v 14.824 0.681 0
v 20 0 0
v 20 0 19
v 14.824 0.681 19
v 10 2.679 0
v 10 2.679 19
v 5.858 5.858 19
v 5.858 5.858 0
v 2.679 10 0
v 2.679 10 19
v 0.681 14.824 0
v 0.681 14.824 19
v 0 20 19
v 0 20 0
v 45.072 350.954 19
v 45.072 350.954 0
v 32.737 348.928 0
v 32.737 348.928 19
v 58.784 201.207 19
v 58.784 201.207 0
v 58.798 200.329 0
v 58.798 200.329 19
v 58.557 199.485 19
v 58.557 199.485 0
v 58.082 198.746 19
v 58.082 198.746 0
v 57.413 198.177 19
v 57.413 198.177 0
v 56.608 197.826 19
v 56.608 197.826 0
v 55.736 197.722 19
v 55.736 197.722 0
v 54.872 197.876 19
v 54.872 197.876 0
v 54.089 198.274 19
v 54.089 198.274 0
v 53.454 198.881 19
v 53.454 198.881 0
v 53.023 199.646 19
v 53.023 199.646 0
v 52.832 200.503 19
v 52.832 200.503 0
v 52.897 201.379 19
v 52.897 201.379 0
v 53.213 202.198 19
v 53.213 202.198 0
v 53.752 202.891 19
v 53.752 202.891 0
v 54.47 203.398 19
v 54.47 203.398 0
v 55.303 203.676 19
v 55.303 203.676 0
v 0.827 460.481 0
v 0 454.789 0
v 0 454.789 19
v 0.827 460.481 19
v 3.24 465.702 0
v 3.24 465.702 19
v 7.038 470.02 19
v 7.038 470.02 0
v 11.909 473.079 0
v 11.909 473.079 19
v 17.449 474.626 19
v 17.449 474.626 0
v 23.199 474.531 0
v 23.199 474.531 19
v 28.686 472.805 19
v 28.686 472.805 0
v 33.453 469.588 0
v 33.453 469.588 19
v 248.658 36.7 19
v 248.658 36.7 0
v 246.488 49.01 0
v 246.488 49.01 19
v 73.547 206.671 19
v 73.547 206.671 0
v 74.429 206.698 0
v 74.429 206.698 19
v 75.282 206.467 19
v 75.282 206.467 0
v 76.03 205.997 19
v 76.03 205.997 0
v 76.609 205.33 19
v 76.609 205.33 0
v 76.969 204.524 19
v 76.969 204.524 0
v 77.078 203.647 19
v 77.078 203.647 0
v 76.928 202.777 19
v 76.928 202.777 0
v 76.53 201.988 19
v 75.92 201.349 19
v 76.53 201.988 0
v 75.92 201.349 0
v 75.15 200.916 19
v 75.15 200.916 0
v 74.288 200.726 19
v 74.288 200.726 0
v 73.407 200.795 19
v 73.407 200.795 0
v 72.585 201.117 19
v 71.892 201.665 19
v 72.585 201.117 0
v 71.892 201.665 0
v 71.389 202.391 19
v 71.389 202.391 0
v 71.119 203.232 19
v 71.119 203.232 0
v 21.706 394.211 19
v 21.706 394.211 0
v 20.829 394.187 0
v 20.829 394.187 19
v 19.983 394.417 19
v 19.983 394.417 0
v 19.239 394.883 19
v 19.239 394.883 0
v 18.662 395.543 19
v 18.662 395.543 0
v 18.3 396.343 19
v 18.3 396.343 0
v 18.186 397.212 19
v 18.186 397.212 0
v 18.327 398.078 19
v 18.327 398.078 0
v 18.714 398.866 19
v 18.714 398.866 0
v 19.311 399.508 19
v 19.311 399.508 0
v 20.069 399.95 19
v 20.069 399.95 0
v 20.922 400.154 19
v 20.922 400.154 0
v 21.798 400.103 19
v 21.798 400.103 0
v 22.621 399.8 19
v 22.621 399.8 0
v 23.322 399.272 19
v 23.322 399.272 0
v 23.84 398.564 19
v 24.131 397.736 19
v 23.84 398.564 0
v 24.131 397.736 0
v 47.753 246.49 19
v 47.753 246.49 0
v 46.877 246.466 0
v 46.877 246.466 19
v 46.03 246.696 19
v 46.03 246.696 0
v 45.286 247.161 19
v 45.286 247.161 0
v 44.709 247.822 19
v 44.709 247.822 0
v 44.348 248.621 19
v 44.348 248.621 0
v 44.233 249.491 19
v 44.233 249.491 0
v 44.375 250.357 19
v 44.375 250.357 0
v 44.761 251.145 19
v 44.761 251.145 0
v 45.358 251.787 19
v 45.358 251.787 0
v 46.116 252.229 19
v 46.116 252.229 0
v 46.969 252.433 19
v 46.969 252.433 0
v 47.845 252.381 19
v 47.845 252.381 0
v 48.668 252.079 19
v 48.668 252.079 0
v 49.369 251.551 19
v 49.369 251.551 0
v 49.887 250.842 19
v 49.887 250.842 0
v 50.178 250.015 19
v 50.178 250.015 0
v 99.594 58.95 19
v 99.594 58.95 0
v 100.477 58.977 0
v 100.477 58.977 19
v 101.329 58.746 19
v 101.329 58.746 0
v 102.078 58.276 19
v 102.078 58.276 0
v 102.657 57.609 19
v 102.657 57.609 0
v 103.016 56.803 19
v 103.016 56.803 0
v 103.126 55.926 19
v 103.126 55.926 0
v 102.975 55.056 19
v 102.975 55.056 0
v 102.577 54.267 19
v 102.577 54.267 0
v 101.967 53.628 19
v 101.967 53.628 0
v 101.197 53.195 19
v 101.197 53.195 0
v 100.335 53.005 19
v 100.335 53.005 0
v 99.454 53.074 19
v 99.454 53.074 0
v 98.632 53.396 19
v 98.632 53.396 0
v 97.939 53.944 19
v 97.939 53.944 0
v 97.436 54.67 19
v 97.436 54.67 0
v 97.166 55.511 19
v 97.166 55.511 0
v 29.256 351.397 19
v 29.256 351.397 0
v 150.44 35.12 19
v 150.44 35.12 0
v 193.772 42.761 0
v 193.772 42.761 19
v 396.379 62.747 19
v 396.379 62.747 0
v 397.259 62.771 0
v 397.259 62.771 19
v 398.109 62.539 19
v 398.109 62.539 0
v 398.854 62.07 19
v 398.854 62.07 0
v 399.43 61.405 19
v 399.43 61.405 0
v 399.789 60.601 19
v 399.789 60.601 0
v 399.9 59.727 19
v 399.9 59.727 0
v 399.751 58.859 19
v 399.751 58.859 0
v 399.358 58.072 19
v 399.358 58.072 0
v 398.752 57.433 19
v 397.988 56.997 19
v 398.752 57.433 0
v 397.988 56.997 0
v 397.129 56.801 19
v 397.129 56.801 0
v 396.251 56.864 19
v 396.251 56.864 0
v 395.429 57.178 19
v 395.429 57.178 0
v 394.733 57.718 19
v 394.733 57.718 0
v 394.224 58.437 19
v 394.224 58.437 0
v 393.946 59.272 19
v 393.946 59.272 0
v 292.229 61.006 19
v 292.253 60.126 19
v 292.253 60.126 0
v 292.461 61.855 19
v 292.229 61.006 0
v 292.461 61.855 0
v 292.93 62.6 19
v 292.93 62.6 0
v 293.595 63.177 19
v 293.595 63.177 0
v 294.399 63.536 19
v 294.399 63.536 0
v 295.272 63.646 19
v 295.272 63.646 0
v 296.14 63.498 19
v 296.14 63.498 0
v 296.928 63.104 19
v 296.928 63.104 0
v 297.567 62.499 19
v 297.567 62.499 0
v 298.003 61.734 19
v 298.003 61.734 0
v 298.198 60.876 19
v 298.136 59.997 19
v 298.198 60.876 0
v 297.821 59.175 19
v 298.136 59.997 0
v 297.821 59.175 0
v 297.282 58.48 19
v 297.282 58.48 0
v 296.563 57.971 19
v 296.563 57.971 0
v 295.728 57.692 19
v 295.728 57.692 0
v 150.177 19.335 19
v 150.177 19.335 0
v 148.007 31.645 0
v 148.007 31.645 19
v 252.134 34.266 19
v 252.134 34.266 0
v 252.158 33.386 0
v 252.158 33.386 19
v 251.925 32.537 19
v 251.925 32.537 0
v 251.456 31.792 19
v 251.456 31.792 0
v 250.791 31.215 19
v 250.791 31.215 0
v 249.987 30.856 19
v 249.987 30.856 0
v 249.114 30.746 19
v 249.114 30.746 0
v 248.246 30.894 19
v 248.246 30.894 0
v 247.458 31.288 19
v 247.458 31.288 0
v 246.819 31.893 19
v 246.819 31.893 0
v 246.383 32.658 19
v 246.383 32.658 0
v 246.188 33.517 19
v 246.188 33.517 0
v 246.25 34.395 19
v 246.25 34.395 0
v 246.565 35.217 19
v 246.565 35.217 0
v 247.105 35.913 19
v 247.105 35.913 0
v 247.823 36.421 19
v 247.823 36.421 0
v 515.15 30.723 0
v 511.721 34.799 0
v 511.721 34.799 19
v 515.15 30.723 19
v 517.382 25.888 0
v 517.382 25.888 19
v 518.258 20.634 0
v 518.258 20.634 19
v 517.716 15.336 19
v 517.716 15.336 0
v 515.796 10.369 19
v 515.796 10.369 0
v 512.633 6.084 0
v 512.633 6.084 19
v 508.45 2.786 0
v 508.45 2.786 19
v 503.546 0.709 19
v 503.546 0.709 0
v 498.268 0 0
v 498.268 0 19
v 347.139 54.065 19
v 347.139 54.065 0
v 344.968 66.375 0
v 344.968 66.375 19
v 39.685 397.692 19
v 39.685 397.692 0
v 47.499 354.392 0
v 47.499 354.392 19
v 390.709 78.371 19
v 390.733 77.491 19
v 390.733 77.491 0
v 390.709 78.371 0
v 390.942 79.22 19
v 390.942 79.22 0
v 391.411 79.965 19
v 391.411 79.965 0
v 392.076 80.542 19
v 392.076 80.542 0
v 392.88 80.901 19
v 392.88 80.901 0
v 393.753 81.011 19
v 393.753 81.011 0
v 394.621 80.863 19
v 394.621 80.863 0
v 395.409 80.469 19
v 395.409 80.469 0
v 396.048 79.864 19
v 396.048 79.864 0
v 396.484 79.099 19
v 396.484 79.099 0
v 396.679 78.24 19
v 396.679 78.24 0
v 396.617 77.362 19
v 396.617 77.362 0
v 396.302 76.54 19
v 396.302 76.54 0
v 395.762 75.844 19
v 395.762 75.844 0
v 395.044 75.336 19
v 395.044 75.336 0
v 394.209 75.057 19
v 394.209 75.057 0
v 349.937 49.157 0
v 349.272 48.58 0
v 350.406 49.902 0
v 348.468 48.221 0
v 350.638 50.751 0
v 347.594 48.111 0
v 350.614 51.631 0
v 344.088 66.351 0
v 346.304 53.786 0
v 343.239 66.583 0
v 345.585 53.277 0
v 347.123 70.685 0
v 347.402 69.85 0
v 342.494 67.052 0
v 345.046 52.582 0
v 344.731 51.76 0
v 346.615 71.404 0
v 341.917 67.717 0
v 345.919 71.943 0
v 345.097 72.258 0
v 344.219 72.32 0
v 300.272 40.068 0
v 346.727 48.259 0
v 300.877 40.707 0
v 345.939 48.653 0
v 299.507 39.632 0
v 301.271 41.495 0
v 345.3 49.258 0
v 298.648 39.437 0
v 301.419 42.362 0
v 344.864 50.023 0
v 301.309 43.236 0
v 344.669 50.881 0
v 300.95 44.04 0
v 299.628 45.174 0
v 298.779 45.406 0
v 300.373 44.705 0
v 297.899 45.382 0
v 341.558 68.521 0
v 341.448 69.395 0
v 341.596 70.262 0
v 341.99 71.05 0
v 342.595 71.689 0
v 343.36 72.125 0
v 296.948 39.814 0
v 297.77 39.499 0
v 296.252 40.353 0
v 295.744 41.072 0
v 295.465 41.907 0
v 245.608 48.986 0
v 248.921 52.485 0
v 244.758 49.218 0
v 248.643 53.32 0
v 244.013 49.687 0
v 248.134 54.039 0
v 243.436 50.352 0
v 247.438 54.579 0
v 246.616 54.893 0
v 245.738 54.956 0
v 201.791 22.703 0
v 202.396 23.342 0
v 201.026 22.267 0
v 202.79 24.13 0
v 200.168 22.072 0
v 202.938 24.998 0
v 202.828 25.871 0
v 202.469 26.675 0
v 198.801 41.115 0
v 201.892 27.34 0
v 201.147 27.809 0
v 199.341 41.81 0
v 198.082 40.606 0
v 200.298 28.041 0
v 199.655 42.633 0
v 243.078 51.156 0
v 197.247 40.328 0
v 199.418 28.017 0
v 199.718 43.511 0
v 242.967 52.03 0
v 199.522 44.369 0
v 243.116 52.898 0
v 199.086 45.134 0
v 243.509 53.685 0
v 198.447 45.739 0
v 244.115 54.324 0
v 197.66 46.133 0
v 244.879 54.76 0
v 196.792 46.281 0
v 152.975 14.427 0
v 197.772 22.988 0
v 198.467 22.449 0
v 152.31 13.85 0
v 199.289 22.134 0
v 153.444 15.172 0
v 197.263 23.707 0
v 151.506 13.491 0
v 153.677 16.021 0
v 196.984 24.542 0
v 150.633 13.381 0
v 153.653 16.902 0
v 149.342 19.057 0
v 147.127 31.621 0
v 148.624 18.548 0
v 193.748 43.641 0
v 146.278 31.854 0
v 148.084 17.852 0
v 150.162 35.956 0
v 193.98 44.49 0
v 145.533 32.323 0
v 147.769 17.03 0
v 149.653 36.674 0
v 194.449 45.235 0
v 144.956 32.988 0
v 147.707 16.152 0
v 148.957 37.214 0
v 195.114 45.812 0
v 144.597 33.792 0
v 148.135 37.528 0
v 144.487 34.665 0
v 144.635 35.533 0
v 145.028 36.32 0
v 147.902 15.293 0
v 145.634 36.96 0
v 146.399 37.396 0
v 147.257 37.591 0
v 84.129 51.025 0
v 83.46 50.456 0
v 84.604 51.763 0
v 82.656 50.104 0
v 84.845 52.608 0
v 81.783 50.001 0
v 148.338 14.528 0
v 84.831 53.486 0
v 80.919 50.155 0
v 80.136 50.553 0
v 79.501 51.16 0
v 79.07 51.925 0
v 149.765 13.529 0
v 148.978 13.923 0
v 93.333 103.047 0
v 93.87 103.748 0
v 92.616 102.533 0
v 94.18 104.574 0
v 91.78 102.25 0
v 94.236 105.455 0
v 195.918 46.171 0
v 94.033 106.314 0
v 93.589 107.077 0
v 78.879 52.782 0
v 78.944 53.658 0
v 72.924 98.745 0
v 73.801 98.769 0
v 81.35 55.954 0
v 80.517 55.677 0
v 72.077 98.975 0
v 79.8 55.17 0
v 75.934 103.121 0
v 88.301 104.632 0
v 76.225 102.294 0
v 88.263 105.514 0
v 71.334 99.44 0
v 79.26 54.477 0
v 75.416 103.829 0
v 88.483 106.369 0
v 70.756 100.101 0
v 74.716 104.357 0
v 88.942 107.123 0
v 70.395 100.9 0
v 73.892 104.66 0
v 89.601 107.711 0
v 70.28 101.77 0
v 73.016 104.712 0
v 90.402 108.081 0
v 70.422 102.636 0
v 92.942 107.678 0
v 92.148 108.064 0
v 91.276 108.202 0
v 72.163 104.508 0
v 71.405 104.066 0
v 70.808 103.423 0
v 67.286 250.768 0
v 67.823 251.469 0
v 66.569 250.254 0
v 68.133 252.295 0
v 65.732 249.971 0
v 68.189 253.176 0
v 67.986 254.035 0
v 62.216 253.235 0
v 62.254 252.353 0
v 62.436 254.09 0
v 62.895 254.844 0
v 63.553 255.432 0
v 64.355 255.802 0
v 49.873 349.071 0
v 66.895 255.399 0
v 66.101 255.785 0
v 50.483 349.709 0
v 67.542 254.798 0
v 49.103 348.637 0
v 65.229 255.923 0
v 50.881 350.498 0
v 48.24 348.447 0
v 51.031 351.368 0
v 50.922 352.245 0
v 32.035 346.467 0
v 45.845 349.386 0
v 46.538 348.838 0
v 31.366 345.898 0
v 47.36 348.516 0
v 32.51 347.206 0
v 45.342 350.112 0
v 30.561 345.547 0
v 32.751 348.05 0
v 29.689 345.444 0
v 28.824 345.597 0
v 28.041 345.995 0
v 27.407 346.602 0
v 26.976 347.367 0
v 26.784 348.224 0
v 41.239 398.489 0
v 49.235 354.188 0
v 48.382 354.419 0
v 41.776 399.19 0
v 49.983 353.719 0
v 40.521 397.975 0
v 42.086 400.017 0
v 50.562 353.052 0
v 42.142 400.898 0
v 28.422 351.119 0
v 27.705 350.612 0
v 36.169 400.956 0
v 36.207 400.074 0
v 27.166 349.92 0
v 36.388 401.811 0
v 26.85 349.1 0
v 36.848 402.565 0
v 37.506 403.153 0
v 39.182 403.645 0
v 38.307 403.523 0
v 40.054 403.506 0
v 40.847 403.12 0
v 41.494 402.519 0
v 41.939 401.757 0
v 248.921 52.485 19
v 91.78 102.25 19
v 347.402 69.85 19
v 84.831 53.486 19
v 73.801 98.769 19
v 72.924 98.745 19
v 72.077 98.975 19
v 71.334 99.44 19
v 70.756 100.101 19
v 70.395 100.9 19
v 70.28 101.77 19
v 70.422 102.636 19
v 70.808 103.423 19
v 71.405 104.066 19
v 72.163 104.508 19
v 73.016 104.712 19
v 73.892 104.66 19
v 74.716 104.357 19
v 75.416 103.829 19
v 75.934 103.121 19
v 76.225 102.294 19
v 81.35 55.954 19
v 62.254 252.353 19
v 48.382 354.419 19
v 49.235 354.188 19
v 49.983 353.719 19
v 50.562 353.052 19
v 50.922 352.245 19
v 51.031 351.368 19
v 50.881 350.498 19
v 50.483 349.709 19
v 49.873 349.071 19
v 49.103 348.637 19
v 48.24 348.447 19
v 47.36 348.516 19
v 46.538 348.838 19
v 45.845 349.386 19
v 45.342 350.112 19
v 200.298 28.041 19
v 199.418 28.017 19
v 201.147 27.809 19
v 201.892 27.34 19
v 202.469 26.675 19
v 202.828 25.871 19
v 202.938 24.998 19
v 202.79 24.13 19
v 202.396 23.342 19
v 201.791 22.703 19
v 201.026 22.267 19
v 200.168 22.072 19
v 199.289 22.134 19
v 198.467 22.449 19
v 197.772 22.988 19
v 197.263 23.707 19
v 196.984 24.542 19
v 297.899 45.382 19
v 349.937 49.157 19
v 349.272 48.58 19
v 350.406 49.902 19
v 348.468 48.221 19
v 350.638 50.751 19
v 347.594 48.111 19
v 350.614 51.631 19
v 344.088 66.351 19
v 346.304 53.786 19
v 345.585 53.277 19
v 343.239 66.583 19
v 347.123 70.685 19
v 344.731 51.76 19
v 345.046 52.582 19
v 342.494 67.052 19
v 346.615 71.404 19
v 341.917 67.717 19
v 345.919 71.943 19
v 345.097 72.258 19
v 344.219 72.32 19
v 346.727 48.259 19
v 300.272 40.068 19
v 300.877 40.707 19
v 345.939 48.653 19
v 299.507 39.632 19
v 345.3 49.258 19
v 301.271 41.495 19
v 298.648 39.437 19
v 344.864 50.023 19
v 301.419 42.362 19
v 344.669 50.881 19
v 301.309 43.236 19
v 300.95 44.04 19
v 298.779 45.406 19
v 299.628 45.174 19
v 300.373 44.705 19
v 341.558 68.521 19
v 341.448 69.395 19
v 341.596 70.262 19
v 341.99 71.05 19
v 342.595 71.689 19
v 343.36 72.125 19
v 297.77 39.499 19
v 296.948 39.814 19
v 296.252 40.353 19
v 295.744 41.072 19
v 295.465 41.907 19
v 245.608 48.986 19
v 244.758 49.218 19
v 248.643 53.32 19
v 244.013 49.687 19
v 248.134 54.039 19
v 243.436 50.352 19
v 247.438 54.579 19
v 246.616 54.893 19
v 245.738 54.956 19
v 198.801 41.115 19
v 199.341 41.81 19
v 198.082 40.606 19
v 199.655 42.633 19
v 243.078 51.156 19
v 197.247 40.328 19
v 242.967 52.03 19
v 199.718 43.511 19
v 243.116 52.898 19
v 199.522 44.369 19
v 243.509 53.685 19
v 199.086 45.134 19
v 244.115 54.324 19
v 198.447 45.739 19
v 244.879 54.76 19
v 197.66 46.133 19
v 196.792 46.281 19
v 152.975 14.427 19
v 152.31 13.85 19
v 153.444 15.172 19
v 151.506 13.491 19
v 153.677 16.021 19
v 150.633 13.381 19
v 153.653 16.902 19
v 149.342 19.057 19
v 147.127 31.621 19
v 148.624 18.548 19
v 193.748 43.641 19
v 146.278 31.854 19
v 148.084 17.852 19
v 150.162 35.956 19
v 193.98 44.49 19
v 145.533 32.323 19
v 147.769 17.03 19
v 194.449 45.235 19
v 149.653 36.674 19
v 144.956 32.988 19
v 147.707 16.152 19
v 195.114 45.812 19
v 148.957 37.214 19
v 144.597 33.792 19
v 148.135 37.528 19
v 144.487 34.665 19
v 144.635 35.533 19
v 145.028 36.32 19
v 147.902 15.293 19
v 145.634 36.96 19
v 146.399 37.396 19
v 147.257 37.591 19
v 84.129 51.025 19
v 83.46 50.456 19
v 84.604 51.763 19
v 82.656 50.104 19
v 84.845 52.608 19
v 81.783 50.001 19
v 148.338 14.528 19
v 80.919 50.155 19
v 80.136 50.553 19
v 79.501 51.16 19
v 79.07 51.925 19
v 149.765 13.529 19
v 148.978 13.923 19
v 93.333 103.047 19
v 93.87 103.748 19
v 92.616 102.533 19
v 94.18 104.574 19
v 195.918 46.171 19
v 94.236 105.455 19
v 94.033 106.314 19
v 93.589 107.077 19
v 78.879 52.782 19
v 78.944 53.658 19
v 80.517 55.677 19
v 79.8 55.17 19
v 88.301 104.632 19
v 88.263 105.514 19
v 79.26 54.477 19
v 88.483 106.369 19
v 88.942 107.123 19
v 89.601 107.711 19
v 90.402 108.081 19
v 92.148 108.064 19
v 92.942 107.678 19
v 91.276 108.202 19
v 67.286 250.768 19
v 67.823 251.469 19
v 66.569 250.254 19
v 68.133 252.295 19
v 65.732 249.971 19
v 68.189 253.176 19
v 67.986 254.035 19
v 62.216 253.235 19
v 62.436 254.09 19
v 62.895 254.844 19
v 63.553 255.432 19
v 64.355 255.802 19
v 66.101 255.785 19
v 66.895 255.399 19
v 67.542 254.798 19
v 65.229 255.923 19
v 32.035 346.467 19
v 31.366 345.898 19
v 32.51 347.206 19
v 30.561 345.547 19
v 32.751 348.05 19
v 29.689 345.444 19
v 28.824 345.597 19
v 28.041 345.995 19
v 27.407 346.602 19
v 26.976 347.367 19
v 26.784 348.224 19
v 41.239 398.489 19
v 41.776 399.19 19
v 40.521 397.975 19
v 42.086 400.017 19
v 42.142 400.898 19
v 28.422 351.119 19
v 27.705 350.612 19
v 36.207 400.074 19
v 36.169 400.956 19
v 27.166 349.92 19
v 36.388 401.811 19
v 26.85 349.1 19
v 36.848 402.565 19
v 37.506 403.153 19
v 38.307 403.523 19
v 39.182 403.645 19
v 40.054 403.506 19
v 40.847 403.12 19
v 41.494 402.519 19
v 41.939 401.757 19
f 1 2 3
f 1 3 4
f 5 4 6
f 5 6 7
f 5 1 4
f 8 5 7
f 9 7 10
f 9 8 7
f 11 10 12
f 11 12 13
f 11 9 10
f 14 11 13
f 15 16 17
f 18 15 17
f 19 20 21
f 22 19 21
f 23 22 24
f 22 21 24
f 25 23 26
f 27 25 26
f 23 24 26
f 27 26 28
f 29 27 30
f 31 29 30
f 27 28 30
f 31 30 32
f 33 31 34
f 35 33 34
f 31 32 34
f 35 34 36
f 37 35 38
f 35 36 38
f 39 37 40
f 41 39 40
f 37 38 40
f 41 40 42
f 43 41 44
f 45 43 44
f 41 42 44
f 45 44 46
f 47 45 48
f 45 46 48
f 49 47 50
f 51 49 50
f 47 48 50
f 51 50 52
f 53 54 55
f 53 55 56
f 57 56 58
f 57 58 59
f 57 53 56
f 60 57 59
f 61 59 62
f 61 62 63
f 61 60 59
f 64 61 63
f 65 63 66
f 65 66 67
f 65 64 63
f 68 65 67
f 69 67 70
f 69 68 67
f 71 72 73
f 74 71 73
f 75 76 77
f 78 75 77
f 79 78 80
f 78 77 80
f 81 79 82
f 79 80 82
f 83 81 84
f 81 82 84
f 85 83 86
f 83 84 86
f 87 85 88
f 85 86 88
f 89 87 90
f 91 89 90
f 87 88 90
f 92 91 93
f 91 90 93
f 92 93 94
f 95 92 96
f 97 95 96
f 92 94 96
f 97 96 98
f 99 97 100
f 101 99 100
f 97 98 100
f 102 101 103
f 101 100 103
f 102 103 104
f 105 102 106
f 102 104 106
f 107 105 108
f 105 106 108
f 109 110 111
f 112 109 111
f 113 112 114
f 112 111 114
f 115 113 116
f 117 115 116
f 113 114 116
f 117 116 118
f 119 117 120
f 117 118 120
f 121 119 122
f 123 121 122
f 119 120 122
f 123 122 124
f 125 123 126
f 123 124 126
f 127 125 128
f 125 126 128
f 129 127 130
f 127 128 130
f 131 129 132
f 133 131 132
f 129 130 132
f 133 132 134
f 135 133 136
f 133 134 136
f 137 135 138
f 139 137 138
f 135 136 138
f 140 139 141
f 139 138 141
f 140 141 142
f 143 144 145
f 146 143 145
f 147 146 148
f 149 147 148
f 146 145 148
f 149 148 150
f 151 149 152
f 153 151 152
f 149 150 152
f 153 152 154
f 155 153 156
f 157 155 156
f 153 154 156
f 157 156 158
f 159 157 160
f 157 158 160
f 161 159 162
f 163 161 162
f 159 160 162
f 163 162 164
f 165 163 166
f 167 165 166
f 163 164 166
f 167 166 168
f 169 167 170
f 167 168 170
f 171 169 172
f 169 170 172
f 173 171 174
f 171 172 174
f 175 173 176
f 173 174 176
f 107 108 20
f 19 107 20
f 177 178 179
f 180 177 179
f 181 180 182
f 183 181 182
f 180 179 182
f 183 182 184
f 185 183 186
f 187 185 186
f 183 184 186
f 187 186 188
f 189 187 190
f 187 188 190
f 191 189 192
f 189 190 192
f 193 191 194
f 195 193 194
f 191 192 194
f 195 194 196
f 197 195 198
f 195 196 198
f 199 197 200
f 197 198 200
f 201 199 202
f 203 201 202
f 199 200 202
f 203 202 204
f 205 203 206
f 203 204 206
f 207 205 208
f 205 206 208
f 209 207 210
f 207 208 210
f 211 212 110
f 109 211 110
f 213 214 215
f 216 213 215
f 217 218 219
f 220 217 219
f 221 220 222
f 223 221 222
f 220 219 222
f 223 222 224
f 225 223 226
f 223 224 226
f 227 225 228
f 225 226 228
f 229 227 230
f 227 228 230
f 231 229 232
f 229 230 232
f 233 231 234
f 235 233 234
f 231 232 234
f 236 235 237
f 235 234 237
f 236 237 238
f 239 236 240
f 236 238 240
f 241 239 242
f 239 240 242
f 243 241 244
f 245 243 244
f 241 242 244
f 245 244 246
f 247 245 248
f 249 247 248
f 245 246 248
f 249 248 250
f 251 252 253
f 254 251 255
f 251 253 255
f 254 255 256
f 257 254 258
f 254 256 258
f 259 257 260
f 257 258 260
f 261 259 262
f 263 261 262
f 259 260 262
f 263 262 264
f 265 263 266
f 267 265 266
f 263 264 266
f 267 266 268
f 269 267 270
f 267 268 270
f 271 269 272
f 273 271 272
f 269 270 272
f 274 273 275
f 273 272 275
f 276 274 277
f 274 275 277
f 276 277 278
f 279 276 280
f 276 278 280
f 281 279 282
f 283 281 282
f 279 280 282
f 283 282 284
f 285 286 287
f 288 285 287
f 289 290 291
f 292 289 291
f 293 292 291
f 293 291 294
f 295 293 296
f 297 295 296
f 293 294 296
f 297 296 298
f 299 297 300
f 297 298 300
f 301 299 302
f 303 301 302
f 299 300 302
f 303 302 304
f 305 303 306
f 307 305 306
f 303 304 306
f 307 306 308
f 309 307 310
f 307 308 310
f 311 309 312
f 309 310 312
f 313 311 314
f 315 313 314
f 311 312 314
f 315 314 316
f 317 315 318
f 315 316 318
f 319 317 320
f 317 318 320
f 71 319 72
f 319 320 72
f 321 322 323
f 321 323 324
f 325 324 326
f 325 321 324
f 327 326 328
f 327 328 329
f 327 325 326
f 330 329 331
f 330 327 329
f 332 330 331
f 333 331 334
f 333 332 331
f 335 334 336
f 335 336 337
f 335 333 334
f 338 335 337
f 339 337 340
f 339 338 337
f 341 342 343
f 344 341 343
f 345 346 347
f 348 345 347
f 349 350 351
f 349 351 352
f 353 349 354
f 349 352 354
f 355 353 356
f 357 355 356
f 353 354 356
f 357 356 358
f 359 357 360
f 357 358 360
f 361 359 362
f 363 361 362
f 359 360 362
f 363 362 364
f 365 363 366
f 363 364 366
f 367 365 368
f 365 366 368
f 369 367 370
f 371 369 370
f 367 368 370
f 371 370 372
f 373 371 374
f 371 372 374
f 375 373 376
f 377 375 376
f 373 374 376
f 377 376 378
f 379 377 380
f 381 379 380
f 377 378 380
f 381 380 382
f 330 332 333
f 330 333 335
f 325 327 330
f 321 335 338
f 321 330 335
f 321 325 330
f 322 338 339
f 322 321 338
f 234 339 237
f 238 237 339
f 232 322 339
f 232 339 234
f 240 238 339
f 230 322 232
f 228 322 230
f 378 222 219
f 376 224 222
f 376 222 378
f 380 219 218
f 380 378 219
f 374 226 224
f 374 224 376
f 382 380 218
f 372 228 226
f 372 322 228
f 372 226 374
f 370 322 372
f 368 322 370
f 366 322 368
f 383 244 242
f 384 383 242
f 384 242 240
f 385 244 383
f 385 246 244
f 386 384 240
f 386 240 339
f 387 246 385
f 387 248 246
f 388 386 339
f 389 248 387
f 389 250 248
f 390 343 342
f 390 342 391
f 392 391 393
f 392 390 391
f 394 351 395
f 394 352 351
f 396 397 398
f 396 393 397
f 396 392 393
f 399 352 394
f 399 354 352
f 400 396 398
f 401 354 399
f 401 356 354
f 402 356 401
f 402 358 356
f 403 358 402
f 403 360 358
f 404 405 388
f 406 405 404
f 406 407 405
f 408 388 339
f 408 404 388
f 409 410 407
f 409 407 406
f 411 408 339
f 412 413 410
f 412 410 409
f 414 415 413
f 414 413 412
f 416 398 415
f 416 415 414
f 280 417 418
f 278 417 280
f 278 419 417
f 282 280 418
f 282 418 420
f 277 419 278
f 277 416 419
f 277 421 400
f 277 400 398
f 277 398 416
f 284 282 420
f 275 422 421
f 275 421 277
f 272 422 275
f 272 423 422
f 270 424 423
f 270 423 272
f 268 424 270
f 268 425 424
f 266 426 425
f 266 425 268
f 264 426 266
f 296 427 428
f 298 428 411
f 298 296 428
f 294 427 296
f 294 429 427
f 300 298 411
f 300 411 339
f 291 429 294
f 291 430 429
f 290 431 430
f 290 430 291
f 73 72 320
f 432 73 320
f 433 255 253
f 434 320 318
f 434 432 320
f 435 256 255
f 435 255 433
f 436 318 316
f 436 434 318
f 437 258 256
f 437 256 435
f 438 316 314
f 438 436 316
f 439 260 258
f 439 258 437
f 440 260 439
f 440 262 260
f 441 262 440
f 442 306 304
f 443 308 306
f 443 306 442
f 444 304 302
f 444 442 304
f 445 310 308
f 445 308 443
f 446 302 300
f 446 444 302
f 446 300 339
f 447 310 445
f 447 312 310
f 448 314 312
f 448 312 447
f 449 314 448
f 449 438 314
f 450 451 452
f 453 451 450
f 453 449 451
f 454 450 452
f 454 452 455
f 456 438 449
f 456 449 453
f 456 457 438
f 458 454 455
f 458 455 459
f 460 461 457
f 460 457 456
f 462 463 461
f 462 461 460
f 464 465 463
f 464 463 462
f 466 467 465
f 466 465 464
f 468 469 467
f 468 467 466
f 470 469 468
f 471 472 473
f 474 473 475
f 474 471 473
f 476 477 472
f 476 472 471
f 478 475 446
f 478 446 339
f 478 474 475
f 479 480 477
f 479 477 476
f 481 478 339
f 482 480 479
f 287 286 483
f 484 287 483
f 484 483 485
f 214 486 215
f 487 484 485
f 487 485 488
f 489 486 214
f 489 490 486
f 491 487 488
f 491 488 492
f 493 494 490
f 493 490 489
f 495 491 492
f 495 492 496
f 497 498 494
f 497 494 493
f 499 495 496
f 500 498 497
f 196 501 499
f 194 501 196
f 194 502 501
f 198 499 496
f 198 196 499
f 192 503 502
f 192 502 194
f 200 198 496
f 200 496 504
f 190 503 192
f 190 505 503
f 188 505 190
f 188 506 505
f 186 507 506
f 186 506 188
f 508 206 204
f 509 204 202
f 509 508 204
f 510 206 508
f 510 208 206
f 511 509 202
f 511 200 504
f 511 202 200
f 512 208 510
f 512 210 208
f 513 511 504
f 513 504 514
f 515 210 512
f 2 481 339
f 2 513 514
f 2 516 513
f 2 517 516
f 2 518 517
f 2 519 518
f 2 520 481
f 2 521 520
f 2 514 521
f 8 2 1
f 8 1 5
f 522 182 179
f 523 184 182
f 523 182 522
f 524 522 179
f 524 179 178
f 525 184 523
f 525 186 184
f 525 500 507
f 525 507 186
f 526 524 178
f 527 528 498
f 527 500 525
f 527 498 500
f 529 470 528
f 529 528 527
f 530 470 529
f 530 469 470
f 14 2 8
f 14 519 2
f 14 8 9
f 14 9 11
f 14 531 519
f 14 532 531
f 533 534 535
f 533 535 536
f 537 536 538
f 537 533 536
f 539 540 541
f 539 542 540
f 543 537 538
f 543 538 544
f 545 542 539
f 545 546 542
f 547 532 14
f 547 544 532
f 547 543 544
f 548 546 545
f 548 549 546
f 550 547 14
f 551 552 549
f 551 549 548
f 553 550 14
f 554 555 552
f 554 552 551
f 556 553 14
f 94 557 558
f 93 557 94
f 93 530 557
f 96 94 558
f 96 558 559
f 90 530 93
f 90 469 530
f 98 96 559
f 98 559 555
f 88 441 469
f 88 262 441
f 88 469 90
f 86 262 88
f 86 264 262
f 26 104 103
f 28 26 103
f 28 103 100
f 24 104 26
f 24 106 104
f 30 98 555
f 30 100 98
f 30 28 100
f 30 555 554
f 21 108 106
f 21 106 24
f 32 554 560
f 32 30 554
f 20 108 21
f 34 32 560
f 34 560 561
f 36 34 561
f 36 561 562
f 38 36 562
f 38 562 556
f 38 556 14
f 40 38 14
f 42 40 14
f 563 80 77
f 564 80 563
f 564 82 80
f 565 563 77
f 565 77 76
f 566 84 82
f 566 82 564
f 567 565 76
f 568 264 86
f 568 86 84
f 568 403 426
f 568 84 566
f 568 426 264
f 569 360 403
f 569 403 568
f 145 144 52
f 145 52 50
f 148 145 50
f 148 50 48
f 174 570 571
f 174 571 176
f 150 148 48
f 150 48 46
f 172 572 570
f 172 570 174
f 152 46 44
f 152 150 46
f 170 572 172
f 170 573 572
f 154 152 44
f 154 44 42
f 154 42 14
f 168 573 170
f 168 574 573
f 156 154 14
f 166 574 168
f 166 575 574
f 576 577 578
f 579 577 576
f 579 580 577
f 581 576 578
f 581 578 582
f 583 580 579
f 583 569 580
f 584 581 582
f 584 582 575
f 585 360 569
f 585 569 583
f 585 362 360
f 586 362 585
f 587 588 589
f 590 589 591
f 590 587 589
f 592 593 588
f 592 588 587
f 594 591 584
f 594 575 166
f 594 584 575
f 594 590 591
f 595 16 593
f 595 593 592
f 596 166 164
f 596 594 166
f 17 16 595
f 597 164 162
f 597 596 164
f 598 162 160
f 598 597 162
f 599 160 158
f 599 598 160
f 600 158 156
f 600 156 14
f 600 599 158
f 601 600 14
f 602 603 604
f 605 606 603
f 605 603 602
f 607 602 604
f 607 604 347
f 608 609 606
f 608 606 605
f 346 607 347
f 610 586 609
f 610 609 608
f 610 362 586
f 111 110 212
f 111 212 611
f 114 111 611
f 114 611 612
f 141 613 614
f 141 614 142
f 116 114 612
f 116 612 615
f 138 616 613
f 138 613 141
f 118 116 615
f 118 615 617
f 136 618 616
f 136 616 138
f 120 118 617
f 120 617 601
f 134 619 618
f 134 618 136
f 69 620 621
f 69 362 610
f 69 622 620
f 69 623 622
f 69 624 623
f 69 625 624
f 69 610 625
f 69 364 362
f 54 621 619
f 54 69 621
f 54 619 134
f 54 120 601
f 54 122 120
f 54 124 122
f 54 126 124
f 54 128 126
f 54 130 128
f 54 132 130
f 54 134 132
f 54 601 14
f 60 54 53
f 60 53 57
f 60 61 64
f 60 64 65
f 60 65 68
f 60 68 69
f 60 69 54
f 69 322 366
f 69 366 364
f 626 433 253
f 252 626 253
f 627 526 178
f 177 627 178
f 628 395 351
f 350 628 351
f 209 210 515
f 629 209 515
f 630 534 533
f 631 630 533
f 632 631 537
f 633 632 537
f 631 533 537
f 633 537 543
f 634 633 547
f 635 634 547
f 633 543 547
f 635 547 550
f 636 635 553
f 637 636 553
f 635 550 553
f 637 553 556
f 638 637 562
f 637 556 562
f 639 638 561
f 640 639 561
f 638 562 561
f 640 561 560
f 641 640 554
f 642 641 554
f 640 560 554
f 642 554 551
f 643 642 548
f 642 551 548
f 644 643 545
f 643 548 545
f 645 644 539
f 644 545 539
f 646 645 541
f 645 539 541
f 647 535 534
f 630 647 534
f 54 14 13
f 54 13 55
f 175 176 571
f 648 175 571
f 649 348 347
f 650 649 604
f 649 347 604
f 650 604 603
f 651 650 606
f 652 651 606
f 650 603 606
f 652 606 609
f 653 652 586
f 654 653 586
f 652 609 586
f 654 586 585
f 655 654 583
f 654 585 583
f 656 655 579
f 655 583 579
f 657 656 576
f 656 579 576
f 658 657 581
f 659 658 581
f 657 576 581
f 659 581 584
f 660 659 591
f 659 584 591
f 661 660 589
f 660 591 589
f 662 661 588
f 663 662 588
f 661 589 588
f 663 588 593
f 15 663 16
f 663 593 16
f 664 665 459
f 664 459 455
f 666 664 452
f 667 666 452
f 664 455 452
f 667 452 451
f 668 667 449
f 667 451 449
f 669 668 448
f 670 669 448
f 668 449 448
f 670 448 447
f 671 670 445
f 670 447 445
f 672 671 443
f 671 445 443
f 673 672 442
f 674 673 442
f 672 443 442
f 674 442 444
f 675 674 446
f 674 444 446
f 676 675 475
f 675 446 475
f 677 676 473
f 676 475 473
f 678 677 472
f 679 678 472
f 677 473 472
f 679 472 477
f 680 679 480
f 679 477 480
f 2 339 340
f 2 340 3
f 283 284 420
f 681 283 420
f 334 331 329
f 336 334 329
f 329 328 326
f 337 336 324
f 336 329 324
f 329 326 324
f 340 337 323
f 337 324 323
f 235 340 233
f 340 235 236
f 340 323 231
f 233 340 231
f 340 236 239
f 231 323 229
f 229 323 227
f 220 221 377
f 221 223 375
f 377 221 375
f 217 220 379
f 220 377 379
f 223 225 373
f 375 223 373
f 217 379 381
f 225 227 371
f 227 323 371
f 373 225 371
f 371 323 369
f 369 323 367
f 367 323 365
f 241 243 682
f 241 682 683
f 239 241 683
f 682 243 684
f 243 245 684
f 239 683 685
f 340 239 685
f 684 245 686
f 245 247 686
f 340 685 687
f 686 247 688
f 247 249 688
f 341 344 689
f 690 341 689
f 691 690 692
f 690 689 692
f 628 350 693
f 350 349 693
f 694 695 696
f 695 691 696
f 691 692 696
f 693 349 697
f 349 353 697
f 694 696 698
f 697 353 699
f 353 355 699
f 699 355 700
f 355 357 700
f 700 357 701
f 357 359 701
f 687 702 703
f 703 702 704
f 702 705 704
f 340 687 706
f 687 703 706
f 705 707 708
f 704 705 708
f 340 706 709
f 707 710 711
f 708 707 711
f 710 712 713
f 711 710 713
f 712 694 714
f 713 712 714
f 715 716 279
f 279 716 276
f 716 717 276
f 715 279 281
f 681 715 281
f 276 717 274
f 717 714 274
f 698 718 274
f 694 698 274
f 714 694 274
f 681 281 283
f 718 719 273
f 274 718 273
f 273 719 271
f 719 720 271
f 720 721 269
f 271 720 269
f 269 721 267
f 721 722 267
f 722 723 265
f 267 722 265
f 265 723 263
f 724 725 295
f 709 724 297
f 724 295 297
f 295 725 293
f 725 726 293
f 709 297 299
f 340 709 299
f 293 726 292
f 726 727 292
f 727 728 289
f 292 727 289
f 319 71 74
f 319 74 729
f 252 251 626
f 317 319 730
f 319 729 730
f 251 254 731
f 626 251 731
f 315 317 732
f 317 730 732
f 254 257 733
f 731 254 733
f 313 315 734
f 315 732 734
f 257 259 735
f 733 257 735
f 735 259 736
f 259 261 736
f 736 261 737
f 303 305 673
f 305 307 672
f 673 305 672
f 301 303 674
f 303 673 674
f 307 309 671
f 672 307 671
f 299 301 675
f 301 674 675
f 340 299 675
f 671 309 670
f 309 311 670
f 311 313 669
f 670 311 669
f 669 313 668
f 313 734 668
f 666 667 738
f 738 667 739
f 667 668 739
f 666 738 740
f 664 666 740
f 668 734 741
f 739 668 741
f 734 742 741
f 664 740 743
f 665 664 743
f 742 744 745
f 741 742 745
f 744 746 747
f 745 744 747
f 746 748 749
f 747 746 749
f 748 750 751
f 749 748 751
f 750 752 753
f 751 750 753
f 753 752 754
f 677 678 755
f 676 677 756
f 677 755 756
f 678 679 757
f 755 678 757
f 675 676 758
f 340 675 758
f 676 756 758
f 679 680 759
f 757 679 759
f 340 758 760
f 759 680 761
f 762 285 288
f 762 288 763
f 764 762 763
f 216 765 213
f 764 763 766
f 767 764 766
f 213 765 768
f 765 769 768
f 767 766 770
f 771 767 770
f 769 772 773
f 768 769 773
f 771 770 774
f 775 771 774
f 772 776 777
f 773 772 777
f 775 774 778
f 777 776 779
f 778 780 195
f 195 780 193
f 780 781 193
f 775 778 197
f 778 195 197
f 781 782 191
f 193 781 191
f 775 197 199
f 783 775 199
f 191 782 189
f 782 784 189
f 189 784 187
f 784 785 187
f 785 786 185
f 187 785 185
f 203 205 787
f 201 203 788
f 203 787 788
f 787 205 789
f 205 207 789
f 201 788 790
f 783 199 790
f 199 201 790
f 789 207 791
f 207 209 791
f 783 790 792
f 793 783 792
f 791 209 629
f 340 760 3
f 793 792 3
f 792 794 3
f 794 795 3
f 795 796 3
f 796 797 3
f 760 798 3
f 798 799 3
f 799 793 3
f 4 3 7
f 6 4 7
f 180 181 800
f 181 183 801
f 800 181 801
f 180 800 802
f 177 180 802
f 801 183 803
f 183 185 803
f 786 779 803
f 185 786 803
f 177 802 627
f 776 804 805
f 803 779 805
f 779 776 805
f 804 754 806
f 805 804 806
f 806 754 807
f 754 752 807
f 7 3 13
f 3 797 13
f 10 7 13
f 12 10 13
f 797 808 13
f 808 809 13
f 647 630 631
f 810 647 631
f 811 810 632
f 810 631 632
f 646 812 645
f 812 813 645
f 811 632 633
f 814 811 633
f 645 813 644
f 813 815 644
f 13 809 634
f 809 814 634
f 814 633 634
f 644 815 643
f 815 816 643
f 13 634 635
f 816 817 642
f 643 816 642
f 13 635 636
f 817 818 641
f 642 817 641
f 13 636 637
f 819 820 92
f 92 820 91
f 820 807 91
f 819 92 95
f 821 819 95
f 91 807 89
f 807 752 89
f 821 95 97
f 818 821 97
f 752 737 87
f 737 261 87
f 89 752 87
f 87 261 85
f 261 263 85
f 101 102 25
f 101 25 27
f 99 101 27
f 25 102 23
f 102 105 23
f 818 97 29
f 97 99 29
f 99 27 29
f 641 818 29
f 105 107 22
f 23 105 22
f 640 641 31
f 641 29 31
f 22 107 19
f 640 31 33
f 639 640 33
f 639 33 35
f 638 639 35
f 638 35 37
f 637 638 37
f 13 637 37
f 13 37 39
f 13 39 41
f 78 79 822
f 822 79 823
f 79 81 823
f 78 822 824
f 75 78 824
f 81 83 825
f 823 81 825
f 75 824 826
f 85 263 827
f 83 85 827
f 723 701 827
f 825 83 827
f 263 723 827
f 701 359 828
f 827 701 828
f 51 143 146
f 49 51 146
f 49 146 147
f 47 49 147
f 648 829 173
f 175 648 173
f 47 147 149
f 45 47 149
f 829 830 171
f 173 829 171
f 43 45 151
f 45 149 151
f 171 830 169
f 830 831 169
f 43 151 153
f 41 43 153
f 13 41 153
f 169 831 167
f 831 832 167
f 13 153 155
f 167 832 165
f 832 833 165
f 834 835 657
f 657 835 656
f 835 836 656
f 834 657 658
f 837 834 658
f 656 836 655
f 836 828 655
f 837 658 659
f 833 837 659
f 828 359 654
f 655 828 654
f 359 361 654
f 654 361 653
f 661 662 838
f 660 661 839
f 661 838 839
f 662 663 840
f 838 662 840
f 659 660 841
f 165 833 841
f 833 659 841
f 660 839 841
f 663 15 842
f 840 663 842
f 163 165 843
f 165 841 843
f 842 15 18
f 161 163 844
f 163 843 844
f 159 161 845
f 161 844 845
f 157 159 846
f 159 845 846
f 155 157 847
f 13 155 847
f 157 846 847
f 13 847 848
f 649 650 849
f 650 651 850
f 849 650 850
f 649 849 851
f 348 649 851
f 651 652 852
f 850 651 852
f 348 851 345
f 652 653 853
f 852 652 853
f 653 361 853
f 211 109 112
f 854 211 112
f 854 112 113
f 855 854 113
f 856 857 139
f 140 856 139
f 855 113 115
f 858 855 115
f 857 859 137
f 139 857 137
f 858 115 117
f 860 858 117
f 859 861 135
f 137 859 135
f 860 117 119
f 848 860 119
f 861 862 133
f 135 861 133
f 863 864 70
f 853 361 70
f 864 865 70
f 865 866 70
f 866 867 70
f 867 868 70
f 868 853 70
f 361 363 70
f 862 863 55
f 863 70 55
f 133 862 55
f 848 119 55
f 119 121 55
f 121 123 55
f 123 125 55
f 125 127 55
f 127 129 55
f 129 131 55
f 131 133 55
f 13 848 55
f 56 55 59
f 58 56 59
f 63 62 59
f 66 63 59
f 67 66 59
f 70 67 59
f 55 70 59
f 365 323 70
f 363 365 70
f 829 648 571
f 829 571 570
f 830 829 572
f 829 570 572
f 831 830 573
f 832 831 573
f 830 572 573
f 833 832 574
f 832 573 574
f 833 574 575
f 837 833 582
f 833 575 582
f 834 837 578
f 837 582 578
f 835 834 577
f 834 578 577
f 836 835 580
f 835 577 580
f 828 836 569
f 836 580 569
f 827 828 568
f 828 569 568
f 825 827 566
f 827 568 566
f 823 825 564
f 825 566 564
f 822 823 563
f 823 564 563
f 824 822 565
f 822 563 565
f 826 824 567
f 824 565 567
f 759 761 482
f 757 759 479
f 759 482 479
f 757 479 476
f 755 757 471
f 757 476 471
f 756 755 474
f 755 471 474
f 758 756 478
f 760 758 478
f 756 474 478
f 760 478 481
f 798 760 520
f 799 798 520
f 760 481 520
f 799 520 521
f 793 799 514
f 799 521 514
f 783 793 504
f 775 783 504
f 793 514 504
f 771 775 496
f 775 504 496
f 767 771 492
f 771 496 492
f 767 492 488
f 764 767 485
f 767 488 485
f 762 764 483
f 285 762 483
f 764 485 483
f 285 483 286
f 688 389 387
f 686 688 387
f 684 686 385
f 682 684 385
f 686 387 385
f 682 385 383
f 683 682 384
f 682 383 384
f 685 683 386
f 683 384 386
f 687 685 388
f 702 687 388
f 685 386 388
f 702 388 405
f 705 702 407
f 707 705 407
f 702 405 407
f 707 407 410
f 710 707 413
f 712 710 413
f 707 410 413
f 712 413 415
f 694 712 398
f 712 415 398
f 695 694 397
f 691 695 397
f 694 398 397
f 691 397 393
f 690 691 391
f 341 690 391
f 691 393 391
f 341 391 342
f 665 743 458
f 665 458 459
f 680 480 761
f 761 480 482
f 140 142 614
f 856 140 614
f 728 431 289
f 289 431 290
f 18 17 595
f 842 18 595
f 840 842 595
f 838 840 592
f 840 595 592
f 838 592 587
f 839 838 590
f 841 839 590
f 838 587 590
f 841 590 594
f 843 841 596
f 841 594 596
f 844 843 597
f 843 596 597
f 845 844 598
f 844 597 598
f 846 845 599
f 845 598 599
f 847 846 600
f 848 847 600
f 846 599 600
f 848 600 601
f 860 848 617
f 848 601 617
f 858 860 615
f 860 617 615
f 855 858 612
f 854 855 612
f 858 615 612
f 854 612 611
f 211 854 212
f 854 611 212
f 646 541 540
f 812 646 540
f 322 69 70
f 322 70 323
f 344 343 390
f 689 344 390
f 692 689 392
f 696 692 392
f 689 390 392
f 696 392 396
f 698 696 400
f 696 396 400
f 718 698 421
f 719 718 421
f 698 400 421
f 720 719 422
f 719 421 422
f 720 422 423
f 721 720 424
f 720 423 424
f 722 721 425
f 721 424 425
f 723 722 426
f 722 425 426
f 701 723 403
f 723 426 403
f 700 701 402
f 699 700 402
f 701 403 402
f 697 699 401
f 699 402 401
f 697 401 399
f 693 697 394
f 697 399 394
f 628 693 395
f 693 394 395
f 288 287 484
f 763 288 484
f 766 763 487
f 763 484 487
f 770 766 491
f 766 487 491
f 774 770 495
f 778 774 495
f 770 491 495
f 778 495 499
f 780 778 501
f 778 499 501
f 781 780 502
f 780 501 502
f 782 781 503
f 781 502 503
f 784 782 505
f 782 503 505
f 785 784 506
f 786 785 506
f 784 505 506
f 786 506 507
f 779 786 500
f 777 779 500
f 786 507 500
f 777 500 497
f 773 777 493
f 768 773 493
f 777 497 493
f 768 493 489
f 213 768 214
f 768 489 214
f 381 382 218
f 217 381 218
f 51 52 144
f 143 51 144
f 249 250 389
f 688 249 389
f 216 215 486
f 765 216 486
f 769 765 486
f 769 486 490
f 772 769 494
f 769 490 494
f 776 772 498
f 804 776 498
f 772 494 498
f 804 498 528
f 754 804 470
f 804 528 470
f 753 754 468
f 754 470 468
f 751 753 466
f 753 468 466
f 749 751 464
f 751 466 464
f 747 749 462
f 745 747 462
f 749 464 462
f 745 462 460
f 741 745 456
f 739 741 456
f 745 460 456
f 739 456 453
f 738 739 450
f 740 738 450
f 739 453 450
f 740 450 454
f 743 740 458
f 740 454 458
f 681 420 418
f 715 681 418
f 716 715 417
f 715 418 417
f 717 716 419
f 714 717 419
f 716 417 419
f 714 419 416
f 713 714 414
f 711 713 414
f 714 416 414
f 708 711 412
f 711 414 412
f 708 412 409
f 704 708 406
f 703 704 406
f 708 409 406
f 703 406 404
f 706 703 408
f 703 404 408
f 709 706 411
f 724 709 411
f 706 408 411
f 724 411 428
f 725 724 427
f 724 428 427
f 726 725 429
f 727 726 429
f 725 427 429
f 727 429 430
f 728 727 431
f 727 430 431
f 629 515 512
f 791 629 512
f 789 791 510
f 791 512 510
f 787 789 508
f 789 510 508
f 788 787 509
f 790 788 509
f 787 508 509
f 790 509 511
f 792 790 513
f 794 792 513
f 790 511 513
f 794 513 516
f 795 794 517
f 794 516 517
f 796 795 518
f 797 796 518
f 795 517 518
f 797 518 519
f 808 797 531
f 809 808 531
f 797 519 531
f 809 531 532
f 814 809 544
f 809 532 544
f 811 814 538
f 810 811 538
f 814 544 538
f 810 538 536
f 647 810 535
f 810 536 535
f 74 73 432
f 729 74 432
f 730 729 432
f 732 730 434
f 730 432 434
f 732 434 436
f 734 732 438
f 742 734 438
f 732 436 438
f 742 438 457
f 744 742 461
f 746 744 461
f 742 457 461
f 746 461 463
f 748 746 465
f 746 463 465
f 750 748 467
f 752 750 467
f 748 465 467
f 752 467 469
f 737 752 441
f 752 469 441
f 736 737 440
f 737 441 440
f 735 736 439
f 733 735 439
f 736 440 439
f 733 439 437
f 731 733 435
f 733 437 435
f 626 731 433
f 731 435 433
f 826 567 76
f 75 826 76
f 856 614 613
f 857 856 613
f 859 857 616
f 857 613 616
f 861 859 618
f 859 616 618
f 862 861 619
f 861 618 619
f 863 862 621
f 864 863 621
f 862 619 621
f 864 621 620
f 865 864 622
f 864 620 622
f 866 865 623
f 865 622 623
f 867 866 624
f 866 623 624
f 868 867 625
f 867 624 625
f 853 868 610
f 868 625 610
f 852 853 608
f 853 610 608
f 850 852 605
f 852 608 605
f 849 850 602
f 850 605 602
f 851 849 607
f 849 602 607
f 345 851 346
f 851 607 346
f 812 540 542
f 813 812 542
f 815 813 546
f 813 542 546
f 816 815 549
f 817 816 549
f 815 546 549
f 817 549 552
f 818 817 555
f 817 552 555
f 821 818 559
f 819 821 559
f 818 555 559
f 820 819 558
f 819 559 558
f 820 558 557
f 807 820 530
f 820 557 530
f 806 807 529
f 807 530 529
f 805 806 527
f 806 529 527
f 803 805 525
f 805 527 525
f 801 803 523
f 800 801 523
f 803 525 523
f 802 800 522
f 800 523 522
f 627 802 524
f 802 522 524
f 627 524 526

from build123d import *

# Parameters (mm, degrees)
BOSS_EXTRUDE1_DEPTH = 19


with BuildPart() as part:
    # Sketch1 → Boss-Extrude1 (new body)
    with BuildSketch(Plane.XY):
        with BuildLine():
            Line((0, 20), (0, 454.788965914))
            ThreePointArc((0, 454.788965914), (11.908928303, 473.079251828), (33.45345588, 469.587767382))
            Line((33.45345588, 469.587767382), (511.721318385, 34.798801468))
            ThreePointArc((511.721318385, 34.798801468), (516.922299368, 12.788066464), (498.267862505, 0))
            Line((498.267862505, 0), (20, 0))
            ThreePointArc((20, 0), (5.857864376, 5.857864376), (0, 20))
        make_face()
        with BuildLine():
            Line((24.130575607, 397.736018906), (36.207010666, 400.074453065))
            ThreePointArc((36.207010666, 400.074453065), (40.847447332, 403.119941065), (39.685090804, 397.692457586))
            Line((39.685090804, 397.692457586), (47.499326679, 354.391906577))
            ThreePointArc((47.499326679, 354.391906577), (50.482851851, 349.709309806), (45.071751319, 350.953546922))
            Line((45.071751319, 350.953546922), (32.73690061, 348.928341259))
            ThreePointArc((32.73690061, 348.928341259), (28.041339197, 345.995030056), (29.255591906, 351.396715159))
            Line((29.255591906, 351.396715159), (21.706228811, 394.21128083))
            ThreePointArc((21.706228811, 394.21128083), (18.713515198, 398.865809266), (24.130575607, 397.736018906))
        make_face(mode=Mode.SUBTRACT)
        with BuildLine():
            Line((50.177802257, 250.014855954), (62.254237316, 252.353290113))
            ThreePointArc((62.254237316, 252.353290113), (66.894673982, 255.398778113), (65.732317454, 249.971294634))
            Line((65.732317454, 249.971294634), (73.546553329, 206.670743625))
            ThreePointArc((73.546553329, 206.670743625), (76.530078501, 201.988146855), (71.118977969, 203.23238397))
            Line((71.118977969, 203.23238397), (58.78412726, 201.207178307))
            ThreePointArc((58.78412726, 201.207178307), (54.088565847, 198.273867104), (55.302818556, 203.675552207))
            Line((55.302818556, 203.675552207), (47.753455461, 246.490117878))
            ThreePointArc((47.753455461, 246.490117878), (44.760741848, 251.144646314), (50.177802257, 250.014855954))
        make_face(mode=Mode.SUBTRACT)
        with BuildLine():
            Line((76.225028907, 102.293693002), (88.301463966, 104.632127162))
            ThreePointArc((88.301463966, 104.632127162), (92.941900632, 107.677615161), (91.779544104, 102.250131683))
            Line((91.779544104, 102.250131683), (99.59377998, 58.949580674))
            ThreePointArc((99.59377998, 58.949580674), (102.577305151, 54.266983903), (97.166204619, 55.511221018))
            Line((97.166204619, 55.511221018), (84.83135391, 53.486015355))
            ThreePointArc((84.83135391, 53.486015355), (80.135792497, 50.552704152), (81.350045206, 55.954389255))
            Line((81.350045206, 55.954389255), (73.800682111, 98.768954926))
            ThreePointArc((73.800682111, 98.768954926), (70.807968498, 103.423483362), (76.225028907, 102.293693002))
        make_face(mode=Mode.SUBTRACT)
        with BuildLine():
            Line((248.921064371, 52.485302628), (292.252605504, 60.125822445))
            ThreePointArc((292.252605504, 60.125822445), (296.927758072, 63.104223111), (295.727973296, 57.692343719))
            Line((295.727973296, 57.692343719), (297.898575517, 45.382246806))
            ThreePointArc((297.898575517, 45.382246806), (300.876976182, 40.707094238), (295.46509679, 41.906879014))
            Line((295.46509679, 41.906879014), (252.133555658, 34.266359197))
            ThreePointArc((252.133555658, 34.266359197), (247.45840309, 31.287958531), (248.658187866, 36.699837923))
            Line((248.658187866, 36.699837923), (246.487585645, 49.009934835))
            ThreePointArc((246.487585645, 49.009934835), (243.509184979, 53.685087404), (248.921064371, 52.485302628))
        make_face(mode=Mode.SUBTRACT)
        with BuildLine():
            Line((150.44028907, 35.120484861), (193.771830203, 42.761004678))
            ThreePointArc((193.771830203, 42.761004678), (198.446982771, 45.739405344), (197.247197995, 40.327525952))
            Line((197.247197995, 40.327525952), (199.417800215, 28.01742904))
            ThreePointArc((199.417800215, 28.01742904), (202.396200881, 23.342276471), (196.984321489, 24.542061247))
            Line((196.984321489, 24.542061247), (153.652780357, 16.90154143))
            ThreePointArc((153.652780357, 16.90154143), (148.977627789, 13.923140764), (150.177412565, 19.335020156))
            Line((150.177412565, 19.335020156), (148.006810344, 31.645117069))
            ThreePointArc((148.006810344, 31.645117069), (145.028409678, 36.320269637), (150.44028907, 35.120484861))
        make_face(mode=Mode.SUBTRACT)
        with BuildLine():
            Line((347.401839672, 69.850120394), (390.733380805, 77.490640212))
            ThreePointArc((390.733380805, 77.490640212), (395.408533373, 80.469040877), (394.208748597, 75.057161485))
            Line((394.208748597, 75.057161485), (396.379350818, 62.747064573))
            ThreePointArc((396.379350818, 62.747064573), (399.357751483, 58.071912005), (393.945872092, 59.271696781))
            Line((393.945872092, 59.271696781), (350.614330959, 51.631176963))
            ThreePointArc((350.614330959, 51.631176963), (345.939178391, 48.652776298), (347.138963167, 54.064655689))
            Line((347.138963167, 54.064655689), (344.968360946, 66.374752602))
            ThreePointArc((344.968360946, 66.374752602), (341.98996028, 71.04990517), (347.401839672, 69.850120394))
        make_face(mode=Mode.SUBTRACT)
    extrude(amount=BOSS_EXTRUDE1_DEPTH)


solid = part.part
